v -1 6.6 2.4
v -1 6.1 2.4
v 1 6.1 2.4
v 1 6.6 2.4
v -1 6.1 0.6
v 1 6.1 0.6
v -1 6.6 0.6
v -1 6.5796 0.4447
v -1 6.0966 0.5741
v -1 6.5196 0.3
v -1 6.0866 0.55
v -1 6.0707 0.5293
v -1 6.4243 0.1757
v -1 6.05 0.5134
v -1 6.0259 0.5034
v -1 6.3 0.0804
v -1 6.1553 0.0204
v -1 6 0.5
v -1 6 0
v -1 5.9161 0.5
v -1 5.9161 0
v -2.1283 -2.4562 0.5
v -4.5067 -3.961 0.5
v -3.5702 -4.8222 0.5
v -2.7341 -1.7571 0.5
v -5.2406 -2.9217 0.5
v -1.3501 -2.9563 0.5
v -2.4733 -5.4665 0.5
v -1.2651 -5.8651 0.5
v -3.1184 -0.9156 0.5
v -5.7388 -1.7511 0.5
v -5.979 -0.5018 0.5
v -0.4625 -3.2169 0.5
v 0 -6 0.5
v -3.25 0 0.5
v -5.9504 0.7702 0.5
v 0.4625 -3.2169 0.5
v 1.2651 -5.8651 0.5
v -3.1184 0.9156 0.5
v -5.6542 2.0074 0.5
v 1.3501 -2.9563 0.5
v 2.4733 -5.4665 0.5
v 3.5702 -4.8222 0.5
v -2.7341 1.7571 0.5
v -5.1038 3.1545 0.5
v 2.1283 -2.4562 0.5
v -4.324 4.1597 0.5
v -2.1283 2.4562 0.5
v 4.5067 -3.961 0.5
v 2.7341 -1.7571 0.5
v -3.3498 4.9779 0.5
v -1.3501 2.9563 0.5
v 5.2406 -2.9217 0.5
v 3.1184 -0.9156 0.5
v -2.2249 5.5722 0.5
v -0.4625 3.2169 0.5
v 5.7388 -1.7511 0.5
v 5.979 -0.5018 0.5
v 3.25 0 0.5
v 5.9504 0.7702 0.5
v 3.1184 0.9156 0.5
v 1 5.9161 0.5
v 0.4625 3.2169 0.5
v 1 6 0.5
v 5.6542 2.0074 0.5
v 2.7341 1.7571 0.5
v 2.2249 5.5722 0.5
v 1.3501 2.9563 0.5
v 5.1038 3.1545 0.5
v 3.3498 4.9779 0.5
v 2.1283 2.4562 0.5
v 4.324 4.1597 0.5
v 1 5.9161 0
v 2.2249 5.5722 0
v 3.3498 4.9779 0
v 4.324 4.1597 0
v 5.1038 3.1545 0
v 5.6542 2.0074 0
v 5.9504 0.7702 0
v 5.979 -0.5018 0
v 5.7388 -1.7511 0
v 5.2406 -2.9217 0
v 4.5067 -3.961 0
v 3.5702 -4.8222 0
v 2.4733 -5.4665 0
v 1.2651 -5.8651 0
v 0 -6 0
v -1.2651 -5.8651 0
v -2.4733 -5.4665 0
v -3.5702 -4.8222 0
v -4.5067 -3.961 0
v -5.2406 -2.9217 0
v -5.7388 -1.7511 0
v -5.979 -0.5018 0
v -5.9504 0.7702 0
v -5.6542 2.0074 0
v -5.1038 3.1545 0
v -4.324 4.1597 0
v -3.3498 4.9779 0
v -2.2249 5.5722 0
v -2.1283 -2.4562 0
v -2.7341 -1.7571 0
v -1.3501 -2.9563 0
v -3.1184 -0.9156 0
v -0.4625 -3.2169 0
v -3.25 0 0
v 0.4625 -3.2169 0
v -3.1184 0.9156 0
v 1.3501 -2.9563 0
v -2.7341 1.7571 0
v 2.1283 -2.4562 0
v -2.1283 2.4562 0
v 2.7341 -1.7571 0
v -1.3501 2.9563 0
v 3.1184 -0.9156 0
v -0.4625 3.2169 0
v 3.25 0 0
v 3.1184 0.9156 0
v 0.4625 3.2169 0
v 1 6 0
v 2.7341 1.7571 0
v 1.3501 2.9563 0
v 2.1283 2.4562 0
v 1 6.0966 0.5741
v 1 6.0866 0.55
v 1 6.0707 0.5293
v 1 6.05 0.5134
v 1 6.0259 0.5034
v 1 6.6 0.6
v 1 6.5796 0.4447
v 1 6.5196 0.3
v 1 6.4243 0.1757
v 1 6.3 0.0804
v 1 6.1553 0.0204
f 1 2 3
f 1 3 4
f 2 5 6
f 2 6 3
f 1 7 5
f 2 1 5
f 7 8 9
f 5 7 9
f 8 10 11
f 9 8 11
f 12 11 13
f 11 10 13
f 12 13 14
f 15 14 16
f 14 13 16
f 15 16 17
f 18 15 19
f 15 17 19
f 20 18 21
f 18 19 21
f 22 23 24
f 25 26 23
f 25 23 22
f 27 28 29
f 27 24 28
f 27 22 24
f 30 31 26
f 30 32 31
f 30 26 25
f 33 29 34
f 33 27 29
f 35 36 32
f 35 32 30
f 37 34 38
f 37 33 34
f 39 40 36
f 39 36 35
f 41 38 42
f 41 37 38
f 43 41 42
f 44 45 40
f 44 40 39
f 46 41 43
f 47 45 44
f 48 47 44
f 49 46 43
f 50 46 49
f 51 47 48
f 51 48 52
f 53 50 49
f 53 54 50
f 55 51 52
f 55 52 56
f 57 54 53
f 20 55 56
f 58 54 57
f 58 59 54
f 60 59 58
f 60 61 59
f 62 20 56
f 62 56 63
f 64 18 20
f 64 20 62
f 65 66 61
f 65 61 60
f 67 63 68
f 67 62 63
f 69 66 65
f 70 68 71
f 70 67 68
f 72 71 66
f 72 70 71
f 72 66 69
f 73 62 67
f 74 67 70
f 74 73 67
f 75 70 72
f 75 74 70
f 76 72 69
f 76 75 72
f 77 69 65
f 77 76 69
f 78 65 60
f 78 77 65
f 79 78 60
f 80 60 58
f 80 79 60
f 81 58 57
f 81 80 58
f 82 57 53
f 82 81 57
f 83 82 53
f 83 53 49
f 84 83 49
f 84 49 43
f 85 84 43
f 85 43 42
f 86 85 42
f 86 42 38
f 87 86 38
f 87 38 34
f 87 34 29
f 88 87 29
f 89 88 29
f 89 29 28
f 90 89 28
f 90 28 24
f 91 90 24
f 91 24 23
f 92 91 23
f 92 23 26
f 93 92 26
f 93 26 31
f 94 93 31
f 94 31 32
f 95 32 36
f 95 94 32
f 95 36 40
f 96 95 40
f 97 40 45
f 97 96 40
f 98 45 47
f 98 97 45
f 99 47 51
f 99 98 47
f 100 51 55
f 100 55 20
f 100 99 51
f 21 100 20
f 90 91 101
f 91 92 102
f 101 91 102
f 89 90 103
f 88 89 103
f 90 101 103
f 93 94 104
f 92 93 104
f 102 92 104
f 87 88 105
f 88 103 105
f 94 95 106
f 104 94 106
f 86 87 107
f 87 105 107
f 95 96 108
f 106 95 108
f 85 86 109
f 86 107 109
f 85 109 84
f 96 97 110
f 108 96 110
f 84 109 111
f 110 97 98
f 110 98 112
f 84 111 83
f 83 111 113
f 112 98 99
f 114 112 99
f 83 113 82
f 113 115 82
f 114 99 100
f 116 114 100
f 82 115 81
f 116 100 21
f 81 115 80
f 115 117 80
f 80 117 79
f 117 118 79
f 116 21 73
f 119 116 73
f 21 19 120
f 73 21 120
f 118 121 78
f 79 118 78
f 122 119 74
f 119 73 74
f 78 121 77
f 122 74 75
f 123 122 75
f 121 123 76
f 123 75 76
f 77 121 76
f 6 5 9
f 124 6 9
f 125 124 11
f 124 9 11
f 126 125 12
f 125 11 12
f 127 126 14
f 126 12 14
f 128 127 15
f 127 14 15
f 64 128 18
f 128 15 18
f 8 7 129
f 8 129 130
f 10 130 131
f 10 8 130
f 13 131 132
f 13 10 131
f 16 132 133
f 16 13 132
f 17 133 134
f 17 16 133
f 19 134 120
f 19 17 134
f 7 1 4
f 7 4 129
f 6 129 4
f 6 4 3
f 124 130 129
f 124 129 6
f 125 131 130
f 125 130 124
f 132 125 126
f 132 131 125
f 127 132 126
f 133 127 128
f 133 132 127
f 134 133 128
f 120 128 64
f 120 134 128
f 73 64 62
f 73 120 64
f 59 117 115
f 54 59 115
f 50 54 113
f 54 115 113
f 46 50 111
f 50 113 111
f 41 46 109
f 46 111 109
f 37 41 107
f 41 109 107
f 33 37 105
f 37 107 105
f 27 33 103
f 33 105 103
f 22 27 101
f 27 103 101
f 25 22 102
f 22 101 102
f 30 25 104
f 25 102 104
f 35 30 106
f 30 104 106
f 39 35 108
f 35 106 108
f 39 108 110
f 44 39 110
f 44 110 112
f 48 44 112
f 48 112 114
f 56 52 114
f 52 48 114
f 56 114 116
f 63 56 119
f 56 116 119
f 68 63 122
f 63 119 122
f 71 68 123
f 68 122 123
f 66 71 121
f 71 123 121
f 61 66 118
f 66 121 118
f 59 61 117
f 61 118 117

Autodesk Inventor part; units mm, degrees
ref_plane "YZ Plane" through (0, 0, 0) normal (1, 0, 0) x (0, 1, 0)
ref_plane "XZ Plane" through (0, 0, 0) normal (0, 1, 0) x (-1, 0, 0)
ref_plane "XY Plane" through (0, 0, 0) normal (0, 0, 1) x (1, 0, 0)
sketch "Sketch1" plane through (0, 0, 0) normal (0, 0, 1) x (1, 0, 0)
  circle A0 centre (0, 0) radius 6
  circle A1 centre (0, 0) radius 3.25
  dimension "d0" = 12
  dimension "d1" = 6.5
extrude "Extrusion1" add sketch "Sketch1" along normal blind 0.5
sketch "Sketch2" plane through (0, 0, 0) normal (1, 0, 0) x (0, 1, 0)
  line L0 (-6, 0.5) -> (6, 0.5) projected
  line L1 (-6, 0) -> (6, 0) projected
  line L2 (6, 0) -> (6, 0.5) projected
  line L3 (6.1, 0.6) -> (6.1, 2.4)
  line L4 (6.1, 2.4) -> (6.6, 2.4)
  line L5 (6.6, 2.4) -> (6.6, 0.6)
  arc A0 (6, 0.5) -> (6.1, 0.6) centre (6, 0.6) ccw
  arc A1 (6, 0) -> (6.6, 0.6) centre (6, 0.6) ccw
  line L6 (6, 0.5) -> (6, 0)
  point P0 (0, 0)
  dimension "d6" = 0.2
  dimension "d7" = 0.5
  dimension "d8" = 2.4
extrude "Extrusion2" add sketch "Sketch2" along normal mid plane 2
sketch "Sketch3" plane through (0, 0, 0) normal (0, 0, -1) x (-1, 0, 0)
  circle A0 centre (0, 0) radius 6 projected
  line L0 (-1, 6.6) -> (-1, 6) projected
  line L1 (-1, 6) -> (0, 6) projected
  line L2 (0, 6) -> (1, 6) projected
  line L3 (1, 6) -> (1, 6.6) projected
  line L4 (1, 6.6) -> (-1, 6.6) projected
  line L5 (-1, 6) -> (-1, 5.9161)
  line L6 (1, 6) -> (1, 5.9161)
extrude "Extrusion3" add sketch "Sketch3" against normal up to surface (0.5 mm away) contours A0 L2 L6 | L5 L1 A0
properties part number "SPDT Toggle Switch Anti-Rotation Washer"
